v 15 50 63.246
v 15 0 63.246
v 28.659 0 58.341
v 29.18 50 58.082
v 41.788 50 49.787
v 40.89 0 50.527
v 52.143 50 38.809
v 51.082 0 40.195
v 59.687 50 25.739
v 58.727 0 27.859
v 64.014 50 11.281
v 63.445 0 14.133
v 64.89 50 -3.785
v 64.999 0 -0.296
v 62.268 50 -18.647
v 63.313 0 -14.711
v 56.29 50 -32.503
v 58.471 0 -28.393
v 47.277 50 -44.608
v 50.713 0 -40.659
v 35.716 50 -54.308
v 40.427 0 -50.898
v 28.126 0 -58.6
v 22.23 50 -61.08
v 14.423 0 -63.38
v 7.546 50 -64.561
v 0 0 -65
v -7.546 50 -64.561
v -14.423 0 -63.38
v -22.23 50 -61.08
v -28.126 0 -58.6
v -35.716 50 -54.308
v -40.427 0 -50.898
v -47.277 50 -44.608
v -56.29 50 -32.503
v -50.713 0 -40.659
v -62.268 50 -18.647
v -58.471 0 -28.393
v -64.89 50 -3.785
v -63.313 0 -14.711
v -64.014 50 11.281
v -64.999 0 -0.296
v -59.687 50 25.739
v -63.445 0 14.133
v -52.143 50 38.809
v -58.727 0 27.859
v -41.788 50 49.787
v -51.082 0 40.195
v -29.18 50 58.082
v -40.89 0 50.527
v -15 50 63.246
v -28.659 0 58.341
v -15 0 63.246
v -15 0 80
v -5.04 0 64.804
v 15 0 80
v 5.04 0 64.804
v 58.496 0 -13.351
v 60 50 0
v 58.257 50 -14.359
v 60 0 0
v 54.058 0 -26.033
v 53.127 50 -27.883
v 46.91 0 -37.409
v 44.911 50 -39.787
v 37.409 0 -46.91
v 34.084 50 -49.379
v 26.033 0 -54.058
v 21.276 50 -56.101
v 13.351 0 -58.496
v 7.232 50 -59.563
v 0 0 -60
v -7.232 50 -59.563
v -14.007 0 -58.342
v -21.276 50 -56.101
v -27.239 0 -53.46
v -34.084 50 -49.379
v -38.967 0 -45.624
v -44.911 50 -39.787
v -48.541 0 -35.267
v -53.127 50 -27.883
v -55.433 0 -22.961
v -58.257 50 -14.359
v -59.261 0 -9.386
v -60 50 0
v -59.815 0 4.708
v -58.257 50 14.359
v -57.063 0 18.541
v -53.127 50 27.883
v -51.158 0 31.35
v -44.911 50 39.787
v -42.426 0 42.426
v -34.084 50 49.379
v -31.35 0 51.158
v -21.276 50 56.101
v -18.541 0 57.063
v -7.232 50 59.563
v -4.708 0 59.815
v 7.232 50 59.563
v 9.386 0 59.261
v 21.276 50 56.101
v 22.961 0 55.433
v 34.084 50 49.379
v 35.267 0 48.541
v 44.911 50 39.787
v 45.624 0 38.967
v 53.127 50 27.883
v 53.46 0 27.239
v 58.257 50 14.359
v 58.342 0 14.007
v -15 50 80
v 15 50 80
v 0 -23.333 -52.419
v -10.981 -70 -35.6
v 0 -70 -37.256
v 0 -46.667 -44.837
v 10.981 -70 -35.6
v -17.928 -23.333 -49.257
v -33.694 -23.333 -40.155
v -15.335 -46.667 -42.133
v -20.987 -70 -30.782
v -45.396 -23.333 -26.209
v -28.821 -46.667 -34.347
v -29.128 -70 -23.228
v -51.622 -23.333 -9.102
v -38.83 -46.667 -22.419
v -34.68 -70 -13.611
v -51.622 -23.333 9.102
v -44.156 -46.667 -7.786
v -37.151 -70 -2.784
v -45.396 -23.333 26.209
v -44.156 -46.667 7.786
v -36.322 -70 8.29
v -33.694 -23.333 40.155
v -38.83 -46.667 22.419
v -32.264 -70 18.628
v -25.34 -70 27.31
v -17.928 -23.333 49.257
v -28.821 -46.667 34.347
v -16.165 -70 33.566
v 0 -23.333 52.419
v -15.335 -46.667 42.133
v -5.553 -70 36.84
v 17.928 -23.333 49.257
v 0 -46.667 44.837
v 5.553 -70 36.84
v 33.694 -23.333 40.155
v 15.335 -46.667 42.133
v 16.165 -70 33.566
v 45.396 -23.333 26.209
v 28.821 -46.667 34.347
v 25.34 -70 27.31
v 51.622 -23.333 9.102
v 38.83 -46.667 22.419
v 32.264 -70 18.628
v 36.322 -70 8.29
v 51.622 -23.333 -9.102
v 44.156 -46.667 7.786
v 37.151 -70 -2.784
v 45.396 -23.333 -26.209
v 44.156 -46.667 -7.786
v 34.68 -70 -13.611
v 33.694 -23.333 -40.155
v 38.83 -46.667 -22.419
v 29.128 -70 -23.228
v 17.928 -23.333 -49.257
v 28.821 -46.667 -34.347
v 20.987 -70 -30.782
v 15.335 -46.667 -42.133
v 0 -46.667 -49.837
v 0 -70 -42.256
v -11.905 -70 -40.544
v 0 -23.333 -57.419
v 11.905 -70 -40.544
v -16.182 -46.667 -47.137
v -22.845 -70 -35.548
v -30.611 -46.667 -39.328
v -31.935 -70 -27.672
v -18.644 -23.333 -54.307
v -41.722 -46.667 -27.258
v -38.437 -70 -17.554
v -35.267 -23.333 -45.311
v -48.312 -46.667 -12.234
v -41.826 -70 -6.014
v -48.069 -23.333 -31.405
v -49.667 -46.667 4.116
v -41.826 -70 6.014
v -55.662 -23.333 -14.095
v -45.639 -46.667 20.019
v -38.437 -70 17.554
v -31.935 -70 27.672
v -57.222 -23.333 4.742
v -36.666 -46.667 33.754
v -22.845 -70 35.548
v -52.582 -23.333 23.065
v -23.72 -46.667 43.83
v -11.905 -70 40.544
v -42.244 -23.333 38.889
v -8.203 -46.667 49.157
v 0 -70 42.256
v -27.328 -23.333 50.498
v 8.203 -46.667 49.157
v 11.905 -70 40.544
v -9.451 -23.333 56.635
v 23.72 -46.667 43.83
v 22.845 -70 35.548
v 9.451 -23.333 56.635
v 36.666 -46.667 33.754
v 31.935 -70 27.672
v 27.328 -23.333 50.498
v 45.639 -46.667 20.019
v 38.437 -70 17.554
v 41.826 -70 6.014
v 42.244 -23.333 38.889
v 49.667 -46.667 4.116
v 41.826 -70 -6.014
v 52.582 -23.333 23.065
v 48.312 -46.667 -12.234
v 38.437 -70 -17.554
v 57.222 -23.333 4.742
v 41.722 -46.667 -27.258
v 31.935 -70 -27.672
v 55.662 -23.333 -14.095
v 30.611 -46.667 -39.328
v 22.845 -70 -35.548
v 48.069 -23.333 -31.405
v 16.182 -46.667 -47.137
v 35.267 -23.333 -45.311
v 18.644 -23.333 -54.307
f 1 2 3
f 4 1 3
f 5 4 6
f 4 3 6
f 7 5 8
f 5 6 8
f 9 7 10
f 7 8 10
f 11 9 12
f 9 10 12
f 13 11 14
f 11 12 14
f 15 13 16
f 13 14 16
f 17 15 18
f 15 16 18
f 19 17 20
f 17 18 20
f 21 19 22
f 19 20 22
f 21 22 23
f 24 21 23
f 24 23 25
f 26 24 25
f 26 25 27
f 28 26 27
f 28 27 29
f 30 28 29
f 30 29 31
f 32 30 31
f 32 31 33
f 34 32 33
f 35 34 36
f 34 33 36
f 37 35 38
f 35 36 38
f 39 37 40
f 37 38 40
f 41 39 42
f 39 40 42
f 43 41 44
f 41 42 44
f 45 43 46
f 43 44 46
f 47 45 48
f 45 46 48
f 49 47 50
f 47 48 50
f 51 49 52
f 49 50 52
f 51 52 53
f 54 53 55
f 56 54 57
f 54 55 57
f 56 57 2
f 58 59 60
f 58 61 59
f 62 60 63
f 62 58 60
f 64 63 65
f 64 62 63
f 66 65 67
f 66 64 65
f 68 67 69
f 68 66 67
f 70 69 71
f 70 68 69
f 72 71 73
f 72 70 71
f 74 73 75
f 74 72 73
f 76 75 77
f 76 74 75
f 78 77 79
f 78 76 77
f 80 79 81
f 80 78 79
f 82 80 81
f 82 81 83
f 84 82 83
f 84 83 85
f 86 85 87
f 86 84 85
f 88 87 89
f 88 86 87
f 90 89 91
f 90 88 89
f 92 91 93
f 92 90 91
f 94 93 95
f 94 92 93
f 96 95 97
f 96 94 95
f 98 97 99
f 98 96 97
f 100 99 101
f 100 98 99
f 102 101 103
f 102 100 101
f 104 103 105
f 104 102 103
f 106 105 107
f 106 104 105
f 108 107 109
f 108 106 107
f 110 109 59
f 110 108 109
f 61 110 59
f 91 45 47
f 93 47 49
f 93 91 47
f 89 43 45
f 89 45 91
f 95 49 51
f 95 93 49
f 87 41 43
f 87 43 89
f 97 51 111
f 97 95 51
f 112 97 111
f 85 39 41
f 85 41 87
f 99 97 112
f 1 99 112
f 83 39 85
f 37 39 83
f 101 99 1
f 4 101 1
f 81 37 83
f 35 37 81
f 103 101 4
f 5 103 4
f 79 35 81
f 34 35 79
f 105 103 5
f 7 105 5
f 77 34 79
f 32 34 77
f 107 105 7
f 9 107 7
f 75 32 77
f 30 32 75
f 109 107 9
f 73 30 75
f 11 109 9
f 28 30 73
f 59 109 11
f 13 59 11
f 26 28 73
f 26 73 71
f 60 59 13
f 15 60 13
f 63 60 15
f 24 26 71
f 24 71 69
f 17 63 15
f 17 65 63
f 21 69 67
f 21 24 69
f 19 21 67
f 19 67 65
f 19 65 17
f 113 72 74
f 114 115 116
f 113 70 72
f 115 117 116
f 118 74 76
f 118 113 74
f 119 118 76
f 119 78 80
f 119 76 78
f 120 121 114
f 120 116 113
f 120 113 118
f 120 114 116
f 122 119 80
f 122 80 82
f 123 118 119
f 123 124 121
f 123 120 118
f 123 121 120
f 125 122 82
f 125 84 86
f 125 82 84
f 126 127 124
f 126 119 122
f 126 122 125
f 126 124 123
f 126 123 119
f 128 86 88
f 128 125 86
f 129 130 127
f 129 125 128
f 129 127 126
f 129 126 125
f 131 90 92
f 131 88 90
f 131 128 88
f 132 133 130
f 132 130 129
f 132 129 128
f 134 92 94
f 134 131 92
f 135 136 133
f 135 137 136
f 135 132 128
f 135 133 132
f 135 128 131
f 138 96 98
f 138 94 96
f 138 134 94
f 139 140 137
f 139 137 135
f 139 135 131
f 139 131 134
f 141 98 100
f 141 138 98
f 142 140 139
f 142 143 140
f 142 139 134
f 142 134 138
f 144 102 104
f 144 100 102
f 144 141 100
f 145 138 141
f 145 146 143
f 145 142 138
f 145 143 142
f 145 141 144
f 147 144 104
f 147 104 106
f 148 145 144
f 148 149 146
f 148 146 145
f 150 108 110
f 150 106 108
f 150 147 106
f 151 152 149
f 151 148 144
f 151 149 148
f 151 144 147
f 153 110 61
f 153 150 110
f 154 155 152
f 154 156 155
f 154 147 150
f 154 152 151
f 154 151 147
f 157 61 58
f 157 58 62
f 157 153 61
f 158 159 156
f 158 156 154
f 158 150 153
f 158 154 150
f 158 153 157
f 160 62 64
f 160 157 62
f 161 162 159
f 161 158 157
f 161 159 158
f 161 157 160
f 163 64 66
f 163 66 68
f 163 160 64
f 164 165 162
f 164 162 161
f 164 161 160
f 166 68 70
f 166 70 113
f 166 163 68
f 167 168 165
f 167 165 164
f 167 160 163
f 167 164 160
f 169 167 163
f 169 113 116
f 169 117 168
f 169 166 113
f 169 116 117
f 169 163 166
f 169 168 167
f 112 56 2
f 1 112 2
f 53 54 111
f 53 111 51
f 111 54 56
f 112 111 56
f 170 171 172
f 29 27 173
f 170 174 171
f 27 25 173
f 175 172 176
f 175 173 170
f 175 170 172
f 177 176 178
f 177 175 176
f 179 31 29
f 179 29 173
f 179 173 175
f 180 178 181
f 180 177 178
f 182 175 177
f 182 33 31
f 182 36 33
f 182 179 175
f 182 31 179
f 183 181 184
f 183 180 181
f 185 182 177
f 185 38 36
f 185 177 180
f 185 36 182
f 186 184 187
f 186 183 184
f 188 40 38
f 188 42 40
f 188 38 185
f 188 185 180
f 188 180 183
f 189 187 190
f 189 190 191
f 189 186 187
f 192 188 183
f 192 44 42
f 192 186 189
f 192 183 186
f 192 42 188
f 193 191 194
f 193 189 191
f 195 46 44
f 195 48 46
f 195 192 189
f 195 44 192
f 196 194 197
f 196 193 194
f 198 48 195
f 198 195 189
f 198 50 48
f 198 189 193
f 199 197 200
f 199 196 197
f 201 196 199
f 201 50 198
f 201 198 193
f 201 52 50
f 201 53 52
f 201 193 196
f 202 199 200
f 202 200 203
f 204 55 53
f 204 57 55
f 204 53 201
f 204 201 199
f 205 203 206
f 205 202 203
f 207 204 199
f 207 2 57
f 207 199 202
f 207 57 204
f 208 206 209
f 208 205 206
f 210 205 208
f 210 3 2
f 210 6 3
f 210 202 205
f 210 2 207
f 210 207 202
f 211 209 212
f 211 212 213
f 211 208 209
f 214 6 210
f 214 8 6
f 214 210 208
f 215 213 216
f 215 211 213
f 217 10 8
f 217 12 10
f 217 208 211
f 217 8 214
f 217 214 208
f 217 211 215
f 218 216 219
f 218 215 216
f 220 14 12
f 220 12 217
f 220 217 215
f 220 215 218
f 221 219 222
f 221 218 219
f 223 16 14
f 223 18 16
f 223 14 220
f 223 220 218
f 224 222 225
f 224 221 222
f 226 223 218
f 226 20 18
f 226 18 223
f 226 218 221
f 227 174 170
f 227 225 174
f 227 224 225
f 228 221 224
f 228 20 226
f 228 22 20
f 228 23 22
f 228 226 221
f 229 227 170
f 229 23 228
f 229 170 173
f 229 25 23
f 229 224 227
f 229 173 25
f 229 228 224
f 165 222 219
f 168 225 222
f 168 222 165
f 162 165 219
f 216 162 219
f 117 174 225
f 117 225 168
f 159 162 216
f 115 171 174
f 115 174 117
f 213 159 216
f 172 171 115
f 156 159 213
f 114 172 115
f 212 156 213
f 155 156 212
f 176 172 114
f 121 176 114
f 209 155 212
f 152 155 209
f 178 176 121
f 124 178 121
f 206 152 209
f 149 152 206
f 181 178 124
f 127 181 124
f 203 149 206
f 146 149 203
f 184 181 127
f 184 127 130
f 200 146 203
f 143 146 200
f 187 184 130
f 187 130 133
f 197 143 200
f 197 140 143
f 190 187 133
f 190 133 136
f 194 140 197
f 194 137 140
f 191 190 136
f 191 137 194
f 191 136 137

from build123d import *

# Parameters (mm, degrees)
SKETCH2_R           = 65
SKETCH2_R_2         = 60
EXTRUDE_THIN1_DEPTH = 50
SKETCH4_W           = 30
SKETCH4_H           = 20
BOSS_EXTRUDE1_DEPTH = 50


with BuildPart() as part:
    # Sketch2 → Extrude-Thin1 (new body)
    with BuildSketch(Plane(origin=(0, 0, 0), x_dir=(1, 0, 0), z_dir=(0, 1, 0))):
        Circle(SKETCH2_R)
        Circle(SKETCH2_R_2, mode=Mode.SUBTRACT)
    extrude(amount=EXTRUDE_THIN1_DEPTH)

    # Sketch3 → Revolve1 (revolve)
    with BuildSketch(Plane(origin=(0, 0, 0), x_dir=(0, 0, -1), z_dir=(1, 0, 0)), mode=Mode.PRIVATE) as revolve1_sk:
        Polygon((-65, 0), (-60, 0), (-37.255621264, -70), (-42.255621264, -70), align=None)
    revolve(revolve1_sk.sketch.rotate(Axis((0, 0, 0), (0, 1, 0)), 180), axis=Axis((0, 0, 0), (0, 1, 0)))

    # Sketch4 → Boss-Extrude1 (add)
    with BuildSketch(Plane(origin=(0, 0, 0), x_dir=(1, 0, 0), z_dir=(0, 1, 0))):
        with Locations((0, -70)):
            Rectangle(SKETCH4_W, SKETCH4_H)
    extrude(amount=BOSS_EXTRUDE1_DEPTH)


solid = part.part
